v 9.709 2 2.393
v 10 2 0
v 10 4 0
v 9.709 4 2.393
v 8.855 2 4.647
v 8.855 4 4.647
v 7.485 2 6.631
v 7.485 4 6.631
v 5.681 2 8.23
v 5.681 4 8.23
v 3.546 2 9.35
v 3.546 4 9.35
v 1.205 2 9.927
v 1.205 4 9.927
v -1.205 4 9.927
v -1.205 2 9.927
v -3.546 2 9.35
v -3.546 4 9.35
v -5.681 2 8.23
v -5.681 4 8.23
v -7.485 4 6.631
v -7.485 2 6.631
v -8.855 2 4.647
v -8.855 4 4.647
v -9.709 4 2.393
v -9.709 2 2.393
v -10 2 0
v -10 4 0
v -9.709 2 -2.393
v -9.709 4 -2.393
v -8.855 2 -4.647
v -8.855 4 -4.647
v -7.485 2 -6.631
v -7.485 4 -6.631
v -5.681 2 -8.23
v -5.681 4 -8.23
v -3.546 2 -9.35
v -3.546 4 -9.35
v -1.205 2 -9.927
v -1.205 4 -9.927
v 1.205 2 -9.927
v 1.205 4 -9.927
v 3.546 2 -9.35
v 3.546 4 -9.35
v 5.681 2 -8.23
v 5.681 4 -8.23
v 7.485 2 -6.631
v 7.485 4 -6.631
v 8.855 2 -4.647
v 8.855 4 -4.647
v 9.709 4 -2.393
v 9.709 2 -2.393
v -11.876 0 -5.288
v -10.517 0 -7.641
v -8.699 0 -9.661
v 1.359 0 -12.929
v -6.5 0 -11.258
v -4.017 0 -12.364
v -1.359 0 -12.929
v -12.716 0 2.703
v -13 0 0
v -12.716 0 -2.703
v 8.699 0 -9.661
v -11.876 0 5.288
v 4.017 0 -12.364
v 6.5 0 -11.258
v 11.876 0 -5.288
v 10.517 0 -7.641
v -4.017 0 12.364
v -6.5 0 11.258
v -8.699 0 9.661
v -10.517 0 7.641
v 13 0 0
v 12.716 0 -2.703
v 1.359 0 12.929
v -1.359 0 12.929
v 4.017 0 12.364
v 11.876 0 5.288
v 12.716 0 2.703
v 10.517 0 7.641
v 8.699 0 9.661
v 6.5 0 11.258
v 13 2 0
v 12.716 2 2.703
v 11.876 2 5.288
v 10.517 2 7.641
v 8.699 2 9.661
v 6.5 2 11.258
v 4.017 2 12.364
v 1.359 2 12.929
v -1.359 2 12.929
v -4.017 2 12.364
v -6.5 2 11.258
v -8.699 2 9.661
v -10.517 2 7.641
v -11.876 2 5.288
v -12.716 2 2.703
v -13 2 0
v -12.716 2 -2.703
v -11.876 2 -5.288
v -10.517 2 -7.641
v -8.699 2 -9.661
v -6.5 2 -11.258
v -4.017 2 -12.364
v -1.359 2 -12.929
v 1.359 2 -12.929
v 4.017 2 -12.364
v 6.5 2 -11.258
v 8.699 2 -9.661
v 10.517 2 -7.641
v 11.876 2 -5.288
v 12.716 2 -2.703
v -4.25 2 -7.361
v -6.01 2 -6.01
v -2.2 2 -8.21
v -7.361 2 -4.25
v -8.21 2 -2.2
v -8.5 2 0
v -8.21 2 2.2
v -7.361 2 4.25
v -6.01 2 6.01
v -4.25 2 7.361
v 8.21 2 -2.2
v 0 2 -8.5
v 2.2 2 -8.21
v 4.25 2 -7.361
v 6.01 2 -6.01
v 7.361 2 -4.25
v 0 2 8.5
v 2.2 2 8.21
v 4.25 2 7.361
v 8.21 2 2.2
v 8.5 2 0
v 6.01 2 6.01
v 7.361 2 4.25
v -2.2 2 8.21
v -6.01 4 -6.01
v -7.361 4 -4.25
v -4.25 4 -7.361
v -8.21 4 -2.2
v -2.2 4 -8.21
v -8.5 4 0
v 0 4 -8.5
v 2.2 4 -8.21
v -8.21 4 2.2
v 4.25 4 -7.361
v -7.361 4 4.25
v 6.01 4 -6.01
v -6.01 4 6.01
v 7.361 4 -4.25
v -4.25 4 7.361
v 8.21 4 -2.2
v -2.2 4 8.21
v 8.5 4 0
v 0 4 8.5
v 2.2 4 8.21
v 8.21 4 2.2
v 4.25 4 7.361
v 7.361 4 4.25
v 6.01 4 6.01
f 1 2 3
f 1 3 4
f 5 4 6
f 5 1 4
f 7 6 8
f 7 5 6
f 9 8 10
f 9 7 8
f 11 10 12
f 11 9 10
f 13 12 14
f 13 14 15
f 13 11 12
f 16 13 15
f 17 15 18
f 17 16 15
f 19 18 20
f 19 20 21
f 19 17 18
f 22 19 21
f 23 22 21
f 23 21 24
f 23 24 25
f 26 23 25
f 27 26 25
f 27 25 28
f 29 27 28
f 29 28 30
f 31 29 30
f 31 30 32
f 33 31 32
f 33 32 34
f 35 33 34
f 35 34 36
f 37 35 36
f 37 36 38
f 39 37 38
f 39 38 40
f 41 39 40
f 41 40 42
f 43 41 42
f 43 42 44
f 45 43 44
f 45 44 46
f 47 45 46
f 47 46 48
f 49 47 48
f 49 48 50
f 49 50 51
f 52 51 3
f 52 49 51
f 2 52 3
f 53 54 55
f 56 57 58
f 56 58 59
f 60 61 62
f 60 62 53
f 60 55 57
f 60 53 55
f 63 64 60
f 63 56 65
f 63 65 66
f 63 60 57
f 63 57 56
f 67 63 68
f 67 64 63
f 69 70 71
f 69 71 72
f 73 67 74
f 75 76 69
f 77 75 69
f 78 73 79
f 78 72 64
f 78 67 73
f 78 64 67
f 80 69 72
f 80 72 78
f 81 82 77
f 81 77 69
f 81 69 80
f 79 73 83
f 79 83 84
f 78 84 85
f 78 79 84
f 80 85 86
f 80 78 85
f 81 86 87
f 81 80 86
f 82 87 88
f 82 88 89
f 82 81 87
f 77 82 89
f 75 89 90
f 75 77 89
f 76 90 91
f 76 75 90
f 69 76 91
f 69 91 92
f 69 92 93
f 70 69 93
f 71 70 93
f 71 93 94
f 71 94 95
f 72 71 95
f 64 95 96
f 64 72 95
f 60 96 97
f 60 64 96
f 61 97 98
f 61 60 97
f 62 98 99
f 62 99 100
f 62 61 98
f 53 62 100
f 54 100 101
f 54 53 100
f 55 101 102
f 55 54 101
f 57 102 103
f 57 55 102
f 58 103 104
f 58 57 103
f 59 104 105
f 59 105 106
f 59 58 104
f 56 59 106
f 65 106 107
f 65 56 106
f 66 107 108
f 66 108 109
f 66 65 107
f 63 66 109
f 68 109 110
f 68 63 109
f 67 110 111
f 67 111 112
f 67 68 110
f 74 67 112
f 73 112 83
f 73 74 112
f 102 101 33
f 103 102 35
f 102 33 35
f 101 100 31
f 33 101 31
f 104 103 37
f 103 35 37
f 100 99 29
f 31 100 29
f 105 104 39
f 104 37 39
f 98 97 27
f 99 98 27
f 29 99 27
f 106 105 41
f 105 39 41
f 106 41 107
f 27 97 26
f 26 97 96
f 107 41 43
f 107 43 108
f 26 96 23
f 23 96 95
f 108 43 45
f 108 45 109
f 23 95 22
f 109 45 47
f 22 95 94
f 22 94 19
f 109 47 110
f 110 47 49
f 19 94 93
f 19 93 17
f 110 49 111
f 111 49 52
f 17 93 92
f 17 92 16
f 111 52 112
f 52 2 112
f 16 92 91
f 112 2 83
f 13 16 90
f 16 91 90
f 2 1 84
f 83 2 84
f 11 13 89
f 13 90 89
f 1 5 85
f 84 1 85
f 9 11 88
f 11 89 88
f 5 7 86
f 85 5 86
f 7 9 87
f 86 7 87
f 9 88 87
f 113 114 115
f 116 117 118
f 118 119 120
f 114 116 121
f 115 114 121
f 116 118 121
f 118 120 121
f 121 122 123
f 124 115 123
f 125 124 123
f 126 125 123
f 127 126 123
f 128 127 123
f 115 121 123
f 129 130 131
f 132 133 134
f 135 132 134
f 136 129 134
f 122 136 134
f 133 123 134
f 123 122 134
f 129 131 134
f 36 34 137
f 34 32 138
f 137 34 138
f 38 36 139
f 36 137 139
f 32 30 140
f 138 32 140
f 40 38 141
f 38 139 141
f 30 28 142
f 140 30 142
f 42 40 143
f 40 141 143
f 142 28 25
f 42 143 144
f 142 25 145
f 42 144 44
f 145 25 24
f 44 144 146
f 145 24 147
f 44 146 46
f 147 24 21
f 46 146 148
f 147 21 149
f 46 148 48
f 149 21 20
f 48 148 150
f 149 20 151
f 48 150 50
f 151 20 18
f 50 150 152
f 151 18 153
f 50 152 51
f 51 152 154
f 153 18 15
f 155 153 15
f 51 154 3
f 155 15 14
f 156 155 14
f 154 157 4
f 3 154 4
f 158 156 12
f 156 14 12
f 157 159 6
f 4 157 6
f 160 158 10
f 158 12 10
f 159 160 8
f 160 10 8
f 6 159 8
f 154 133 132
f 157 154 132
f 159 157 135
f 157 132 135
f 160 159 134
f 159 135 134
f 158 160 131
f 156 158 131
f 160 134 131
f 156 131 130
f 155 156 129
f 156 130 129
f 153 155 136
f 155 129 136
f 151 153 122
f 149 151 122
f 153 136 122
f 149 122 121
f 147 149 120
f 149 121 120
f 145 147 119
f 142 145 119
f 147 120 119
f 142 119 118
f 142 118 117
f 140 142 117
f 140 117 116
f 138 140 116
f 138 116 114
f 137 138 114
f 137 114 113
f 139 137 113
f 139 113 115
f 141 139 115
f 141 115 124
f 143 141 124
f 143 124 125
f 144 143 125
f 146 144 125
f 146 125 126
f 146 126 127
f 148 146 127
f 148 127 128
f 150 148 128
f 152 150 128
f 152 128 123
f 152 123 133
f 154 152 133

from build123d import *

# Parameters (mm, degrees)
F0_R     = 13
F0_R_2   = 10
F1_DEPTH = 2
F0_R_3   = 8.5
F2_DEPTH = 4
F3_DEPTH = 2


with BuildPart() as f1:
    # F0 (on Front) → F1 (new body)
    with BuildSketch(Plane.XZ):
        Circle(F0_R)
        Circle(F0_R_2, mode=Mode.SUBTRACT)
    extrude(amount=-F1_DEPTH)

    # F0 (on Front) → F2 (join)
    with BuildSketch(Plane.XZ):
        Circle(F0_R_2)
        Circle(F0_R_3, mode=Mode.SUBTRACT)
    extrude(amount=-F2_DEPTH)

    # F0 (on Front) → F3 (join)
    with BuildSketch(Plane.XZ):
        Circle(F0_R_3)
    extrude(amount=-F3_DEPTH)


solid = f1.part
